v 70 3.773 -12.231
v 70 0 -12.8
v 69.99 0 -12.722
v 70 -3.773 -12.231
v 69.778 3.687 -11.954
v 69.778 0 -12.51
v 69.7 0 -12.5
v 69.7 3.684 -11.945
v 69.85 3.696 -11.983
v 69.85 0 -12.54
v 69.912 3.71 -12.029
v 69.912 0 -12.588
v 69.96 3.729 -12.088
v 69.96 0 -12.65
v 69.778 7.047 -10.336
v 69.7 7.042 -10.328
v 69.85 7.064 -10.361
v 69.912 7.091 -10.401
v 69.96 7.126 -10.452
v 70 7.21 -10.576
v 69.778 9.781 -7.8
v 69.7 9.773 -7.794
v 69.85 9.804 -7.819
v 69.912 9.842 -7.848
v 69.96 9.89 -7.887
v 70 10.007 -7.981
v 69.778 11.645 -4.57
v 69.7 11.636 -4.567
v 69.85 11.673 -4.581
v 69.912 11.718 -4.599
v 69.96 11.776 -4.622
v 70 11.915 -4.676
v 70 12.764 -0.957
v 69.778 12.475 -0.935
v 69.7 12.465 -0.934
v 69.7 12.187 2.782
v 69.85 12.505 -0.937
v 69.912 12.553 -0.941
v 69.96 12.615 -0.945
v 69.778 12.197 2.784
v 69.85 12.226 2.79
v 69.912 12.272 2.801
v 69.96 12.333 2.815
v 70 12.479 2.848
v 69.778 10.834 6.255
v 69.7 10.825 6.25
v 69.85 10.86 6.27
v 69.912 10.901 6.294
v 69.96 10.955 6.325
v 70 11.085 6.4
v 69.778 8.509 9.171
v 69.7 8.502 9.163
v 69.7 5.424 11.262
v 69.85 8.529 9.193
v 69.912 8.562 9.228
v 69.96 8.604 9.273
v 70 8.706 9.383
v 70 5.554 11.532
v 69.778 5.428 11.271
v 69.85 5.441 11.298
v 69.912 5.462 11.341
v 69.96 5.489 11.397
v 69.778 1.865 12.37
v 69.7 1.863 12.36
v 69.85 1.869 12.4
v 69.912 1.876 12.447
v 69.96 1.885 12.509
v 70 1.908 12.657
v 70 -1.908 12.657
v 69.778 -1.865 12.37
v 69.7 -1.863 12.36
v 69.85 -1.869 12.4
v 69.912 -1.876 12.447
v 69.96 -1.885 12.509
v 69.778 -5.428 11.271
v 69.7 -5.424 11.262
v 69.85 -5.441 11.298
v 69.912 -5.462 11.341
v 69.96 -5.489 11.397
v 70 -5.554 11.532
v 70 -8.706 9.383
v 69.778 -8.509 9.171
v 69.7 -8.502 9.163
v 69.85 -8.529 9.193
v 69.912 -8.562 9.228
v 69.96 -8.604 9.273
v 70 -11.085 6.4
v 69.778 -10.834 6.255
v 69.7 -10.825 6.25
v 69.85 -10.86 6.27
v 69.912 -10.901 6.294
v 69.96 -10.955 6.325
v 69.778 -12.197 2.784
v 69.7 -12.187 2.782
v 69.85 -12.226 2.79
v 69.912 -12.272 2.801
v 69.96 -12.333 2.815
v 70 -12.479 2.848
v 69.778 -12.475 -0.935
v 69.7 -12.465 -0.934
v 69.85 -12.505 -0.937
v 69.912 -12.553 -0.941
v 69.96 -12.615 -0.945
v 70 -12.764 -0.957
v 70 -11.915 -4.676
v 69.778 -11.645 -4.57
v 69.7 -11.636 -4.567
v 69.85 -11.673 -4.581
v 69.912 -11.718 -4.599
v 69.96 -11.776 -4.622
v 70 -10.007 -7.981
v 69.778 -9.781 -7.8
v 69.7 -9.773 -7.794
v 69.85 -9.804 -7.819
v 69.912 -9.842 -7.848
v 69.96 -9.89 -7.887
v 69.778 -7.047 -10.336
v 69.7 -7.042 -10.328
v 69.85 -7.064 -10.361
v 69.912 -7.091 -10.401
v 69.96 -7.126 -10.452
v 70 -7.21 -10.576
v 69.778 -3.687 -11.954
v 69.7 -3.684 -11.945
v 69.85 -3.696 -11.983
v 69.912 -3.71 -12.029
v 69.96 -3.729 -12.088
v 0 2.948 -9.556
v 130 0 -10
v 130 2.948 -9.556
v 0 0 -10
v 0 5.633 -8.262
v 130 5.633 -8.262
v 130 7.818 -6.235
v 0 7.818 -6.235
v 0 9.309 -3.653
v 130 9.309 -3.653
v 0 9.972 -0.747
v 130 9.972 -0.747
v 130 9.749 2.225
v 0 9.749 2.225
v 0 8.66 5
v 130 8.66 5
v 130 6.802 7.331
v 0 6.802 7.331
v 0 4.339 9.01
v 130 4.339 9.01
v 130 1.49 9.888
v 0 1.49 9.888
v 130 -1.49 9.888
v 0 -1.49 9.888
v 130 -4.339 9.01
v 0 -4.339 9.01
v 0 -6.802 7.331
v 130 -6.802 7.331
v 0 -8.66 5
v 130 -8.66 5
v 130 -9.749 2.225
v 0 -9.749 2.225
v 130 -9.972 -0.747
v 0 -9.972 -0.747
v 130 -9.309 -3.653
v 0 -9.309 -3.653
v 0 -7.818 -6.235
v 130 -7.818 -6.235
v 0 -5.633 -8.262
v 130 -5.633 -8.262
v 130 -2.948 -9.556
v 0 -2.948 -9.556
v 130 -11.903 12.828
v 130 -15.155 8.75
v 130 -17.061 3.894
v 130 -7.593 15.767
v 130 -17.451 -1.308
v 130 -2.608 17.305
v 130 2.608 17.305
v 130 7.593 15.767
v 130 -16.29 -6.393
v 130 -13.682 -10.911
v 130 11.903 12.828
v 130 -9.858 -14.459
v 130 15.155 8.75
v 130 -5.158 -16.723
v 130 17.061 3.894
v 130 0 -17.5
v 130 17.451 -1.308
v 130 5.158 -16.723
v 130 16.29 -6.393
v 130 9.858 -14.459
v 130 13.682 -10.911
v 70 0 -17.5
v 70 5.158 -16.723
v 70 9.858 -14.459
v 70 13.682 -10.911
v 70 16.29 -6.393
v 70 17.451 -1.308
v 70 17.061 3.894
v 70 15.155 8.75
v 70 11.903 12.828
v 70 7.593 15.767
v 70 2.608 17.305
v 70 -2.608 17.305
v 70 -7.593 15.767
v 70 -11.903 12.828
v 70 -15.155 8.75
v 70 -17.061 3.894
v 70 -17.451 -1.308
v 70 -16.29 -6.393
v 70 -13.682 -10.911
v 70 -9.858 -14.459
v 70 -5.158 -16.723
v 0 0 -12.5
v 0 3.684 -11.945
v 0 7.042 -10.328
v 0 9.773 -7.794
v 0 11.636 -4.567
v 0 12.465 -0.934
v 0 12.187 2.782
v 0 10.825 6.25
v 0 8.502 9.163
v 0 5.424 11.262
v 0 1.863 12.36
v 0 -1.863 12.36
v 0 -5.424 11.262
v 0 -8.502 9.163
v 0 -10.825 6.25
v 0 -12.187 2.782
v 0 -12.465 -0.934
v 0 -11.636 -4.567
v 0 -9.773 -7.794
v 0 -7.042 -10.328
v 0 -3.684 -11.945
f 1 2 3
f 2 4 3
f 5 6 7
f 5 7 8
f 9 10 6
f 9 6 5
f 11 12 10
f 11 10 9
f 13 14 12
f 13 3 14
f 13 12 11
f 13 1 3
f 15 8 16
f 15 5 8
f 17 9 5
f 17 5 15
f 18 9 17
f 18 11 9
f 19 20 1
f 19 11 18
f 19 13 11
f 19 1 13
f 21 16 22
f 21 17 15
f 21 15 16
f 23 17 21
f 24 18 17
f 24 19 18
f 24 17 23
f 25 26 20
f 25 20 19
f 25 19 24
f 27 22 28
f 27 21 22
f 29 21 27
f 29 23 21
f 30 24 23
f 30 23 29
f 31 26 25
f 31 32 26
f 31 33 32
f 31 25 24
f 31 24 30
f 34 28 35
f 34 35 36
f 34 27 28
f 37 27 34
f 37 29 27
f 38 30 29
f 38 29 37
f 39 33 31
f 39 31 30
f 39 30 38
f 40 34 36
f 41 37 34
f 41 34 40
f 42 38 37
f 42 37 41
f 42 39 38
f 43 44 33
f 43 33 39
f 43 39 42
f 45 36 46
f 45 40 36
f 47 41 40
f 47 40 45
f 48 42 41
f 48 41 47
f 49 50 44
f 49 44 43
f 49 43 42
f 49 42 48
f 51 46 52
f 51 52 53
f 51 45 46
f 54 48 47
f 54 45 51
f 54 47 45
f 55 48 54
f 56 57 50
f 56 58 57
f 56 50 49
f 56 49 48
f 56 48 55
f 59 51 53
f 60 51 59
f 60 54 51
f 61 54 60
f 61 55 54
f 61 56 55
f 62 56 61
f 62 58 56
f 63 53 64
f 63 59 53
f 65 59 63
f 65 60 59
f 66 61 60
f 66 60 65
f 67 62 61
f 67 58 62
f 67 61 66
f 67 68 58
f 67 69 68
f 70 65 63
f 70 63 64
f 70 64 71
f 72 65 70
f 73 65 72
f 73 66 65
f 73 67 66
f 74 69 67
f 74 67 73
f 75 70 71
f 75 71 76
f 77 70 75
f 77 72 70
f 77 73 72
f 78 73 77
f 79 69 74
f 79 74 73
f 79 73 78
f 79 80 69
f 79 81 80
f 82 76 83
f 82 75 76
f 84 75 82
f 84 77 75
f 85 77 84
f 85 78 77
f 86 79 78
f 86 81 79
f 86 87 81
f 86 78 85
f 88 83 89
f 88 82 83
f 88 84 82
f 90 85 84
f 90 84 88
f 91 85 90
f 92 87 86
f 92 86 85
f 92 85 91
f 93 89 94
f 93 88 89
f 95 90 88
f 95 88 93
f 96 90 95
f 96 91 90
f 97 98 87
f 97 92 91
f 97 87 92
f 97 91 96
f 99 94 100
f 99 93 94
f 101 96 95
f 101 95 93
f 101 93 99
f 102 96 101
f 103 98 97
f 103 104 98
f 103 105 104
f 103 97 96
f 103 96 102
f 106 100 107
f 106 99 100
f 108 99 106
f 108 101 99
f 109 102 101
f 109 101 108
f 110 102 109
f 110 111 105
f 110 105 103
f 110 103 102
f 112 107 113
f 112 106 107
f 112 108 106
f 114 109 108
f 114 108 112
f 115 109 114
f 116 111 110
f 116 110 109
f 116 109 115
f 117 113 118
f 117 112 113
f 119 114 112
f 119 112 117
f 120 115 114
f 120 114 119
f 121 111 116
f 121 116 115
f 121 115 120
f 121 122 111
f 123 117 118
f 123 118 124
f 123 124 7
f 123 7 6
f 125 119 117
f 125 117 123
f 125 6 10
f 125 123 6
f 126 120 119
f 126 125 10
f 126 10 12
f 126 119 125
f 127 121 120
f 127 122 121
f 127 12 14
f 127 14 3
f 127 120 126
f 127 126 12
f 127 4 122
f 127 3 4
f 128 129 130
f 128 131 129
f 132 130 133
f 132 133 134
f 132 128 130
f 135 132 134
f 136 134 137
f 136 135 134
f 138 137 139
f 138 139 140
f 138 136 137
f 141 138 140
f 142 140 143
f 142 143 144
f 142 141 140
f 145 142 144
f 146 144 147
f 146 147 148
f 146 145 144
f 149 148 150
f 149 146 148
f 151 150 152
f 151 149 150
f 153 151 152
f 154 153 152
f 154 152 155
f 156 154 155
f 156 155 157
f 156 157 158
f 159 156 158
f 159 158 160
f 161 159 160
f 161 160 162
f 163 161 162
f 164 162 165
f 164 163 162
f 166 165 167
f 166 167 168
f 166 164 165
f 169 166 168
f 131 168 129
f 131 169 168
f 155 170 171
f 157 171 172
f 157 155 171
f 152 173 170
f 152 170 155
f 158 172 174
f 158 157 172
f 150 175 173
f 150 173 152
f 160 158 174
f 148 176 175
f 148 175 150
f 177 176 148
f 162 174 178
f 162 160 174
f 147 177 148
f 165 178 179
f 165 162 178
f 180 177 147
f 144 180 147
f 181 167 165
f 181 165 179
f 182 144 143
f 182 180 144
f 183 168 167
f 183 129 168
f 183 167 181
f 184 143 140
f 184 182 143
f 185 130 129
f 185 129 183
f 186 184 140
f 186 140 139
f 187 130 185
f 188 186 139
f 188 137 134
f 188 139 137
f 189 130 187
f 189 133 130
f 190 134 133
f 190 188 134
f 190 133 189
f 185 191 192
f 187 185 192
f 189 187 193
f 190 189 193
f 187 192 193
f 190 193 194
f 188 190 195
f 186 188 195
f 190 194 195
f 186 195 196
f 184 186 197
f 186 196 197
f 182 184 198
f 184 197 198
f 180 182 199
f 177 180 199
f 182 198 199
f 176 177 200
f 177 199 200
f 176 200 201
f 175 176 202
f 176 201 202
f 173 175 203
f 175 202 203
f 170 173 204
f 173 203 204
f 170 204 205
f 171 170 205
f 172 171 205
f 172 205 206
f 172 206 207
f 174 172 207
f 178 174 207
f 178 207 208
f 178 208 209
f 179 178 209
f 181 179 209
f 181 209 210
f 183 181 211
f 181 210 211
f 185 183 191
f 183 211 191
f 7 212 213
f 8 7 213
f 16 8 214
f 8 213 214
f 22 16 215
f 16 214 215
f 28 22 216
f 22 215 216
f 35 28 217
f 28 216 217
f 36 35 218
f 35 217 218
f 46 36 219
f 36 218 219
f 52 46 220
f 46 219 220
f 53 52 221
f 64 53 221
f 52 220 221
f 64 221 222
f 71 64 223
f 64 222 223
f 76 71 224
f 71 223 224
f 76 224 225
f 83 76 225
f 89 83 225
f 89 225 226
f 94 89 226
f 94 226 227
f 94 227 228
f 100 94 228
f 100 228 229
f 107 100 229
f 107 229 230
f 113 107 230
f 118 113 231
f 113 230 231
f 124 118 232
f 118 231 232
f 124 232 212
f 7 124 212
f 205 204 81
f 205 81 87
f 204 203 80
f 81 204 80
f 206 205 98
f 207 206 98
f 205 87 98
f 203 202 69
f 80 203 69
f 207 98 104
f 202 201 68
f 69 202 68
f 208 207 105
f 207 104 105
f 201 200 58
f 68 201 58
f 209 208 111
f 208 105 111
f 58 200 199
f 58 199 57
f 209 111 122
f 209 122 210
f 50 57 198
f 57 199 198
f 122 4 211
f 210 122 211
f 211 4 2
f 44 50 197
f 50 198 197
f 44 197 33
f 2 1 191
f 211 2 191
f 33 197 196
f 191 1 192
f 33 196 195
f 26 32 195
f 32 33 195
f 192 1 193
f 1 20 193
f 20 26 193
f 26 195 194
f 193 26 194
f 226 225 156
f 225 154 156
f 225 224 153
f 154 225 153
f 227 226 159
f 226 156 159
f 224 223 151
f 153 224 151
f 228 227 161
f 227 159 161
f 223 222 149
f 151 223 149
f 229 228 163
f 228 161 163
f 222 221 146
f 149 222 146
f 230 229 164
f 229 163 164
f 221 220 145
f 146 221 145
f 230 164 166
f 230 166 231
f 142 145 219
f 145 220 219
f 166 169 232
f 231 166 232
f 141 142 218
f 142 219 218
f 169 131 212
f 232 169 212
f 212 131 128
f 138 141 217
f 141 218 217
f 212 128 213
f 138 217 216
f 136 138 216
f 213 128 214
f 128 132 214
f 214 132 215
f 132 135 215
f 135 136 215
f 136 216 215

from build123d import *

# Parameters (mm, degrees)
SZKIC1_R                    = 12.5
SZKIC1_R_2                  = 10
DODANIE_WYCI_GNI_CIE1_DEPTH = 70
SZKIC2_R                    = 17.5
SZKIC2_R_2                  = 10
DODANIE_WYCI_GNI_CIE2_DEPTH = 60
ZAOKR_GLENIE1_R             = 0.3


with BuildPart() as part:
    # Szkic1 → Dodanie-wyciągnięcie1 (new body)
    with BuildSketch(Plane(origin=(0, 0, 0), x_dir=(0, 0, -1), z_dir=(1, 0, 0))):
        Circle(SZKIC1_R)
        Circle(SZKIC1_R_2, mode=Mode.SUBTRACT)
    extrude(amount=DODANIE_WYCI_GNI_CIE1_DEPTH)

    # Szkic2 → Dodanie-wyciągnięcie2 (add)
    with BuildSketch(Plane(origin=(70, 0, 0), x_dir=(0, 0, -1), z_dir=(1, 0, 0))):
        Circle(SZKIC2_R)
        Circle(SZKIC2_R_2, mode=Mode.SUBTRACT)
    extrude(amount=DODANIE_WYCI_GNI_CIE2_DEPTH)

    # Zaokrąglenie1
    zaokr_glenie1_edges = [part.edges().sort_by_distance(p)[0] for p in [
        (70, 0, 12.5),
    ]]
    fillet(zaokr_glenie1_edges, radius=ZAOKR_GLENIE1_R)


solid = part.part
